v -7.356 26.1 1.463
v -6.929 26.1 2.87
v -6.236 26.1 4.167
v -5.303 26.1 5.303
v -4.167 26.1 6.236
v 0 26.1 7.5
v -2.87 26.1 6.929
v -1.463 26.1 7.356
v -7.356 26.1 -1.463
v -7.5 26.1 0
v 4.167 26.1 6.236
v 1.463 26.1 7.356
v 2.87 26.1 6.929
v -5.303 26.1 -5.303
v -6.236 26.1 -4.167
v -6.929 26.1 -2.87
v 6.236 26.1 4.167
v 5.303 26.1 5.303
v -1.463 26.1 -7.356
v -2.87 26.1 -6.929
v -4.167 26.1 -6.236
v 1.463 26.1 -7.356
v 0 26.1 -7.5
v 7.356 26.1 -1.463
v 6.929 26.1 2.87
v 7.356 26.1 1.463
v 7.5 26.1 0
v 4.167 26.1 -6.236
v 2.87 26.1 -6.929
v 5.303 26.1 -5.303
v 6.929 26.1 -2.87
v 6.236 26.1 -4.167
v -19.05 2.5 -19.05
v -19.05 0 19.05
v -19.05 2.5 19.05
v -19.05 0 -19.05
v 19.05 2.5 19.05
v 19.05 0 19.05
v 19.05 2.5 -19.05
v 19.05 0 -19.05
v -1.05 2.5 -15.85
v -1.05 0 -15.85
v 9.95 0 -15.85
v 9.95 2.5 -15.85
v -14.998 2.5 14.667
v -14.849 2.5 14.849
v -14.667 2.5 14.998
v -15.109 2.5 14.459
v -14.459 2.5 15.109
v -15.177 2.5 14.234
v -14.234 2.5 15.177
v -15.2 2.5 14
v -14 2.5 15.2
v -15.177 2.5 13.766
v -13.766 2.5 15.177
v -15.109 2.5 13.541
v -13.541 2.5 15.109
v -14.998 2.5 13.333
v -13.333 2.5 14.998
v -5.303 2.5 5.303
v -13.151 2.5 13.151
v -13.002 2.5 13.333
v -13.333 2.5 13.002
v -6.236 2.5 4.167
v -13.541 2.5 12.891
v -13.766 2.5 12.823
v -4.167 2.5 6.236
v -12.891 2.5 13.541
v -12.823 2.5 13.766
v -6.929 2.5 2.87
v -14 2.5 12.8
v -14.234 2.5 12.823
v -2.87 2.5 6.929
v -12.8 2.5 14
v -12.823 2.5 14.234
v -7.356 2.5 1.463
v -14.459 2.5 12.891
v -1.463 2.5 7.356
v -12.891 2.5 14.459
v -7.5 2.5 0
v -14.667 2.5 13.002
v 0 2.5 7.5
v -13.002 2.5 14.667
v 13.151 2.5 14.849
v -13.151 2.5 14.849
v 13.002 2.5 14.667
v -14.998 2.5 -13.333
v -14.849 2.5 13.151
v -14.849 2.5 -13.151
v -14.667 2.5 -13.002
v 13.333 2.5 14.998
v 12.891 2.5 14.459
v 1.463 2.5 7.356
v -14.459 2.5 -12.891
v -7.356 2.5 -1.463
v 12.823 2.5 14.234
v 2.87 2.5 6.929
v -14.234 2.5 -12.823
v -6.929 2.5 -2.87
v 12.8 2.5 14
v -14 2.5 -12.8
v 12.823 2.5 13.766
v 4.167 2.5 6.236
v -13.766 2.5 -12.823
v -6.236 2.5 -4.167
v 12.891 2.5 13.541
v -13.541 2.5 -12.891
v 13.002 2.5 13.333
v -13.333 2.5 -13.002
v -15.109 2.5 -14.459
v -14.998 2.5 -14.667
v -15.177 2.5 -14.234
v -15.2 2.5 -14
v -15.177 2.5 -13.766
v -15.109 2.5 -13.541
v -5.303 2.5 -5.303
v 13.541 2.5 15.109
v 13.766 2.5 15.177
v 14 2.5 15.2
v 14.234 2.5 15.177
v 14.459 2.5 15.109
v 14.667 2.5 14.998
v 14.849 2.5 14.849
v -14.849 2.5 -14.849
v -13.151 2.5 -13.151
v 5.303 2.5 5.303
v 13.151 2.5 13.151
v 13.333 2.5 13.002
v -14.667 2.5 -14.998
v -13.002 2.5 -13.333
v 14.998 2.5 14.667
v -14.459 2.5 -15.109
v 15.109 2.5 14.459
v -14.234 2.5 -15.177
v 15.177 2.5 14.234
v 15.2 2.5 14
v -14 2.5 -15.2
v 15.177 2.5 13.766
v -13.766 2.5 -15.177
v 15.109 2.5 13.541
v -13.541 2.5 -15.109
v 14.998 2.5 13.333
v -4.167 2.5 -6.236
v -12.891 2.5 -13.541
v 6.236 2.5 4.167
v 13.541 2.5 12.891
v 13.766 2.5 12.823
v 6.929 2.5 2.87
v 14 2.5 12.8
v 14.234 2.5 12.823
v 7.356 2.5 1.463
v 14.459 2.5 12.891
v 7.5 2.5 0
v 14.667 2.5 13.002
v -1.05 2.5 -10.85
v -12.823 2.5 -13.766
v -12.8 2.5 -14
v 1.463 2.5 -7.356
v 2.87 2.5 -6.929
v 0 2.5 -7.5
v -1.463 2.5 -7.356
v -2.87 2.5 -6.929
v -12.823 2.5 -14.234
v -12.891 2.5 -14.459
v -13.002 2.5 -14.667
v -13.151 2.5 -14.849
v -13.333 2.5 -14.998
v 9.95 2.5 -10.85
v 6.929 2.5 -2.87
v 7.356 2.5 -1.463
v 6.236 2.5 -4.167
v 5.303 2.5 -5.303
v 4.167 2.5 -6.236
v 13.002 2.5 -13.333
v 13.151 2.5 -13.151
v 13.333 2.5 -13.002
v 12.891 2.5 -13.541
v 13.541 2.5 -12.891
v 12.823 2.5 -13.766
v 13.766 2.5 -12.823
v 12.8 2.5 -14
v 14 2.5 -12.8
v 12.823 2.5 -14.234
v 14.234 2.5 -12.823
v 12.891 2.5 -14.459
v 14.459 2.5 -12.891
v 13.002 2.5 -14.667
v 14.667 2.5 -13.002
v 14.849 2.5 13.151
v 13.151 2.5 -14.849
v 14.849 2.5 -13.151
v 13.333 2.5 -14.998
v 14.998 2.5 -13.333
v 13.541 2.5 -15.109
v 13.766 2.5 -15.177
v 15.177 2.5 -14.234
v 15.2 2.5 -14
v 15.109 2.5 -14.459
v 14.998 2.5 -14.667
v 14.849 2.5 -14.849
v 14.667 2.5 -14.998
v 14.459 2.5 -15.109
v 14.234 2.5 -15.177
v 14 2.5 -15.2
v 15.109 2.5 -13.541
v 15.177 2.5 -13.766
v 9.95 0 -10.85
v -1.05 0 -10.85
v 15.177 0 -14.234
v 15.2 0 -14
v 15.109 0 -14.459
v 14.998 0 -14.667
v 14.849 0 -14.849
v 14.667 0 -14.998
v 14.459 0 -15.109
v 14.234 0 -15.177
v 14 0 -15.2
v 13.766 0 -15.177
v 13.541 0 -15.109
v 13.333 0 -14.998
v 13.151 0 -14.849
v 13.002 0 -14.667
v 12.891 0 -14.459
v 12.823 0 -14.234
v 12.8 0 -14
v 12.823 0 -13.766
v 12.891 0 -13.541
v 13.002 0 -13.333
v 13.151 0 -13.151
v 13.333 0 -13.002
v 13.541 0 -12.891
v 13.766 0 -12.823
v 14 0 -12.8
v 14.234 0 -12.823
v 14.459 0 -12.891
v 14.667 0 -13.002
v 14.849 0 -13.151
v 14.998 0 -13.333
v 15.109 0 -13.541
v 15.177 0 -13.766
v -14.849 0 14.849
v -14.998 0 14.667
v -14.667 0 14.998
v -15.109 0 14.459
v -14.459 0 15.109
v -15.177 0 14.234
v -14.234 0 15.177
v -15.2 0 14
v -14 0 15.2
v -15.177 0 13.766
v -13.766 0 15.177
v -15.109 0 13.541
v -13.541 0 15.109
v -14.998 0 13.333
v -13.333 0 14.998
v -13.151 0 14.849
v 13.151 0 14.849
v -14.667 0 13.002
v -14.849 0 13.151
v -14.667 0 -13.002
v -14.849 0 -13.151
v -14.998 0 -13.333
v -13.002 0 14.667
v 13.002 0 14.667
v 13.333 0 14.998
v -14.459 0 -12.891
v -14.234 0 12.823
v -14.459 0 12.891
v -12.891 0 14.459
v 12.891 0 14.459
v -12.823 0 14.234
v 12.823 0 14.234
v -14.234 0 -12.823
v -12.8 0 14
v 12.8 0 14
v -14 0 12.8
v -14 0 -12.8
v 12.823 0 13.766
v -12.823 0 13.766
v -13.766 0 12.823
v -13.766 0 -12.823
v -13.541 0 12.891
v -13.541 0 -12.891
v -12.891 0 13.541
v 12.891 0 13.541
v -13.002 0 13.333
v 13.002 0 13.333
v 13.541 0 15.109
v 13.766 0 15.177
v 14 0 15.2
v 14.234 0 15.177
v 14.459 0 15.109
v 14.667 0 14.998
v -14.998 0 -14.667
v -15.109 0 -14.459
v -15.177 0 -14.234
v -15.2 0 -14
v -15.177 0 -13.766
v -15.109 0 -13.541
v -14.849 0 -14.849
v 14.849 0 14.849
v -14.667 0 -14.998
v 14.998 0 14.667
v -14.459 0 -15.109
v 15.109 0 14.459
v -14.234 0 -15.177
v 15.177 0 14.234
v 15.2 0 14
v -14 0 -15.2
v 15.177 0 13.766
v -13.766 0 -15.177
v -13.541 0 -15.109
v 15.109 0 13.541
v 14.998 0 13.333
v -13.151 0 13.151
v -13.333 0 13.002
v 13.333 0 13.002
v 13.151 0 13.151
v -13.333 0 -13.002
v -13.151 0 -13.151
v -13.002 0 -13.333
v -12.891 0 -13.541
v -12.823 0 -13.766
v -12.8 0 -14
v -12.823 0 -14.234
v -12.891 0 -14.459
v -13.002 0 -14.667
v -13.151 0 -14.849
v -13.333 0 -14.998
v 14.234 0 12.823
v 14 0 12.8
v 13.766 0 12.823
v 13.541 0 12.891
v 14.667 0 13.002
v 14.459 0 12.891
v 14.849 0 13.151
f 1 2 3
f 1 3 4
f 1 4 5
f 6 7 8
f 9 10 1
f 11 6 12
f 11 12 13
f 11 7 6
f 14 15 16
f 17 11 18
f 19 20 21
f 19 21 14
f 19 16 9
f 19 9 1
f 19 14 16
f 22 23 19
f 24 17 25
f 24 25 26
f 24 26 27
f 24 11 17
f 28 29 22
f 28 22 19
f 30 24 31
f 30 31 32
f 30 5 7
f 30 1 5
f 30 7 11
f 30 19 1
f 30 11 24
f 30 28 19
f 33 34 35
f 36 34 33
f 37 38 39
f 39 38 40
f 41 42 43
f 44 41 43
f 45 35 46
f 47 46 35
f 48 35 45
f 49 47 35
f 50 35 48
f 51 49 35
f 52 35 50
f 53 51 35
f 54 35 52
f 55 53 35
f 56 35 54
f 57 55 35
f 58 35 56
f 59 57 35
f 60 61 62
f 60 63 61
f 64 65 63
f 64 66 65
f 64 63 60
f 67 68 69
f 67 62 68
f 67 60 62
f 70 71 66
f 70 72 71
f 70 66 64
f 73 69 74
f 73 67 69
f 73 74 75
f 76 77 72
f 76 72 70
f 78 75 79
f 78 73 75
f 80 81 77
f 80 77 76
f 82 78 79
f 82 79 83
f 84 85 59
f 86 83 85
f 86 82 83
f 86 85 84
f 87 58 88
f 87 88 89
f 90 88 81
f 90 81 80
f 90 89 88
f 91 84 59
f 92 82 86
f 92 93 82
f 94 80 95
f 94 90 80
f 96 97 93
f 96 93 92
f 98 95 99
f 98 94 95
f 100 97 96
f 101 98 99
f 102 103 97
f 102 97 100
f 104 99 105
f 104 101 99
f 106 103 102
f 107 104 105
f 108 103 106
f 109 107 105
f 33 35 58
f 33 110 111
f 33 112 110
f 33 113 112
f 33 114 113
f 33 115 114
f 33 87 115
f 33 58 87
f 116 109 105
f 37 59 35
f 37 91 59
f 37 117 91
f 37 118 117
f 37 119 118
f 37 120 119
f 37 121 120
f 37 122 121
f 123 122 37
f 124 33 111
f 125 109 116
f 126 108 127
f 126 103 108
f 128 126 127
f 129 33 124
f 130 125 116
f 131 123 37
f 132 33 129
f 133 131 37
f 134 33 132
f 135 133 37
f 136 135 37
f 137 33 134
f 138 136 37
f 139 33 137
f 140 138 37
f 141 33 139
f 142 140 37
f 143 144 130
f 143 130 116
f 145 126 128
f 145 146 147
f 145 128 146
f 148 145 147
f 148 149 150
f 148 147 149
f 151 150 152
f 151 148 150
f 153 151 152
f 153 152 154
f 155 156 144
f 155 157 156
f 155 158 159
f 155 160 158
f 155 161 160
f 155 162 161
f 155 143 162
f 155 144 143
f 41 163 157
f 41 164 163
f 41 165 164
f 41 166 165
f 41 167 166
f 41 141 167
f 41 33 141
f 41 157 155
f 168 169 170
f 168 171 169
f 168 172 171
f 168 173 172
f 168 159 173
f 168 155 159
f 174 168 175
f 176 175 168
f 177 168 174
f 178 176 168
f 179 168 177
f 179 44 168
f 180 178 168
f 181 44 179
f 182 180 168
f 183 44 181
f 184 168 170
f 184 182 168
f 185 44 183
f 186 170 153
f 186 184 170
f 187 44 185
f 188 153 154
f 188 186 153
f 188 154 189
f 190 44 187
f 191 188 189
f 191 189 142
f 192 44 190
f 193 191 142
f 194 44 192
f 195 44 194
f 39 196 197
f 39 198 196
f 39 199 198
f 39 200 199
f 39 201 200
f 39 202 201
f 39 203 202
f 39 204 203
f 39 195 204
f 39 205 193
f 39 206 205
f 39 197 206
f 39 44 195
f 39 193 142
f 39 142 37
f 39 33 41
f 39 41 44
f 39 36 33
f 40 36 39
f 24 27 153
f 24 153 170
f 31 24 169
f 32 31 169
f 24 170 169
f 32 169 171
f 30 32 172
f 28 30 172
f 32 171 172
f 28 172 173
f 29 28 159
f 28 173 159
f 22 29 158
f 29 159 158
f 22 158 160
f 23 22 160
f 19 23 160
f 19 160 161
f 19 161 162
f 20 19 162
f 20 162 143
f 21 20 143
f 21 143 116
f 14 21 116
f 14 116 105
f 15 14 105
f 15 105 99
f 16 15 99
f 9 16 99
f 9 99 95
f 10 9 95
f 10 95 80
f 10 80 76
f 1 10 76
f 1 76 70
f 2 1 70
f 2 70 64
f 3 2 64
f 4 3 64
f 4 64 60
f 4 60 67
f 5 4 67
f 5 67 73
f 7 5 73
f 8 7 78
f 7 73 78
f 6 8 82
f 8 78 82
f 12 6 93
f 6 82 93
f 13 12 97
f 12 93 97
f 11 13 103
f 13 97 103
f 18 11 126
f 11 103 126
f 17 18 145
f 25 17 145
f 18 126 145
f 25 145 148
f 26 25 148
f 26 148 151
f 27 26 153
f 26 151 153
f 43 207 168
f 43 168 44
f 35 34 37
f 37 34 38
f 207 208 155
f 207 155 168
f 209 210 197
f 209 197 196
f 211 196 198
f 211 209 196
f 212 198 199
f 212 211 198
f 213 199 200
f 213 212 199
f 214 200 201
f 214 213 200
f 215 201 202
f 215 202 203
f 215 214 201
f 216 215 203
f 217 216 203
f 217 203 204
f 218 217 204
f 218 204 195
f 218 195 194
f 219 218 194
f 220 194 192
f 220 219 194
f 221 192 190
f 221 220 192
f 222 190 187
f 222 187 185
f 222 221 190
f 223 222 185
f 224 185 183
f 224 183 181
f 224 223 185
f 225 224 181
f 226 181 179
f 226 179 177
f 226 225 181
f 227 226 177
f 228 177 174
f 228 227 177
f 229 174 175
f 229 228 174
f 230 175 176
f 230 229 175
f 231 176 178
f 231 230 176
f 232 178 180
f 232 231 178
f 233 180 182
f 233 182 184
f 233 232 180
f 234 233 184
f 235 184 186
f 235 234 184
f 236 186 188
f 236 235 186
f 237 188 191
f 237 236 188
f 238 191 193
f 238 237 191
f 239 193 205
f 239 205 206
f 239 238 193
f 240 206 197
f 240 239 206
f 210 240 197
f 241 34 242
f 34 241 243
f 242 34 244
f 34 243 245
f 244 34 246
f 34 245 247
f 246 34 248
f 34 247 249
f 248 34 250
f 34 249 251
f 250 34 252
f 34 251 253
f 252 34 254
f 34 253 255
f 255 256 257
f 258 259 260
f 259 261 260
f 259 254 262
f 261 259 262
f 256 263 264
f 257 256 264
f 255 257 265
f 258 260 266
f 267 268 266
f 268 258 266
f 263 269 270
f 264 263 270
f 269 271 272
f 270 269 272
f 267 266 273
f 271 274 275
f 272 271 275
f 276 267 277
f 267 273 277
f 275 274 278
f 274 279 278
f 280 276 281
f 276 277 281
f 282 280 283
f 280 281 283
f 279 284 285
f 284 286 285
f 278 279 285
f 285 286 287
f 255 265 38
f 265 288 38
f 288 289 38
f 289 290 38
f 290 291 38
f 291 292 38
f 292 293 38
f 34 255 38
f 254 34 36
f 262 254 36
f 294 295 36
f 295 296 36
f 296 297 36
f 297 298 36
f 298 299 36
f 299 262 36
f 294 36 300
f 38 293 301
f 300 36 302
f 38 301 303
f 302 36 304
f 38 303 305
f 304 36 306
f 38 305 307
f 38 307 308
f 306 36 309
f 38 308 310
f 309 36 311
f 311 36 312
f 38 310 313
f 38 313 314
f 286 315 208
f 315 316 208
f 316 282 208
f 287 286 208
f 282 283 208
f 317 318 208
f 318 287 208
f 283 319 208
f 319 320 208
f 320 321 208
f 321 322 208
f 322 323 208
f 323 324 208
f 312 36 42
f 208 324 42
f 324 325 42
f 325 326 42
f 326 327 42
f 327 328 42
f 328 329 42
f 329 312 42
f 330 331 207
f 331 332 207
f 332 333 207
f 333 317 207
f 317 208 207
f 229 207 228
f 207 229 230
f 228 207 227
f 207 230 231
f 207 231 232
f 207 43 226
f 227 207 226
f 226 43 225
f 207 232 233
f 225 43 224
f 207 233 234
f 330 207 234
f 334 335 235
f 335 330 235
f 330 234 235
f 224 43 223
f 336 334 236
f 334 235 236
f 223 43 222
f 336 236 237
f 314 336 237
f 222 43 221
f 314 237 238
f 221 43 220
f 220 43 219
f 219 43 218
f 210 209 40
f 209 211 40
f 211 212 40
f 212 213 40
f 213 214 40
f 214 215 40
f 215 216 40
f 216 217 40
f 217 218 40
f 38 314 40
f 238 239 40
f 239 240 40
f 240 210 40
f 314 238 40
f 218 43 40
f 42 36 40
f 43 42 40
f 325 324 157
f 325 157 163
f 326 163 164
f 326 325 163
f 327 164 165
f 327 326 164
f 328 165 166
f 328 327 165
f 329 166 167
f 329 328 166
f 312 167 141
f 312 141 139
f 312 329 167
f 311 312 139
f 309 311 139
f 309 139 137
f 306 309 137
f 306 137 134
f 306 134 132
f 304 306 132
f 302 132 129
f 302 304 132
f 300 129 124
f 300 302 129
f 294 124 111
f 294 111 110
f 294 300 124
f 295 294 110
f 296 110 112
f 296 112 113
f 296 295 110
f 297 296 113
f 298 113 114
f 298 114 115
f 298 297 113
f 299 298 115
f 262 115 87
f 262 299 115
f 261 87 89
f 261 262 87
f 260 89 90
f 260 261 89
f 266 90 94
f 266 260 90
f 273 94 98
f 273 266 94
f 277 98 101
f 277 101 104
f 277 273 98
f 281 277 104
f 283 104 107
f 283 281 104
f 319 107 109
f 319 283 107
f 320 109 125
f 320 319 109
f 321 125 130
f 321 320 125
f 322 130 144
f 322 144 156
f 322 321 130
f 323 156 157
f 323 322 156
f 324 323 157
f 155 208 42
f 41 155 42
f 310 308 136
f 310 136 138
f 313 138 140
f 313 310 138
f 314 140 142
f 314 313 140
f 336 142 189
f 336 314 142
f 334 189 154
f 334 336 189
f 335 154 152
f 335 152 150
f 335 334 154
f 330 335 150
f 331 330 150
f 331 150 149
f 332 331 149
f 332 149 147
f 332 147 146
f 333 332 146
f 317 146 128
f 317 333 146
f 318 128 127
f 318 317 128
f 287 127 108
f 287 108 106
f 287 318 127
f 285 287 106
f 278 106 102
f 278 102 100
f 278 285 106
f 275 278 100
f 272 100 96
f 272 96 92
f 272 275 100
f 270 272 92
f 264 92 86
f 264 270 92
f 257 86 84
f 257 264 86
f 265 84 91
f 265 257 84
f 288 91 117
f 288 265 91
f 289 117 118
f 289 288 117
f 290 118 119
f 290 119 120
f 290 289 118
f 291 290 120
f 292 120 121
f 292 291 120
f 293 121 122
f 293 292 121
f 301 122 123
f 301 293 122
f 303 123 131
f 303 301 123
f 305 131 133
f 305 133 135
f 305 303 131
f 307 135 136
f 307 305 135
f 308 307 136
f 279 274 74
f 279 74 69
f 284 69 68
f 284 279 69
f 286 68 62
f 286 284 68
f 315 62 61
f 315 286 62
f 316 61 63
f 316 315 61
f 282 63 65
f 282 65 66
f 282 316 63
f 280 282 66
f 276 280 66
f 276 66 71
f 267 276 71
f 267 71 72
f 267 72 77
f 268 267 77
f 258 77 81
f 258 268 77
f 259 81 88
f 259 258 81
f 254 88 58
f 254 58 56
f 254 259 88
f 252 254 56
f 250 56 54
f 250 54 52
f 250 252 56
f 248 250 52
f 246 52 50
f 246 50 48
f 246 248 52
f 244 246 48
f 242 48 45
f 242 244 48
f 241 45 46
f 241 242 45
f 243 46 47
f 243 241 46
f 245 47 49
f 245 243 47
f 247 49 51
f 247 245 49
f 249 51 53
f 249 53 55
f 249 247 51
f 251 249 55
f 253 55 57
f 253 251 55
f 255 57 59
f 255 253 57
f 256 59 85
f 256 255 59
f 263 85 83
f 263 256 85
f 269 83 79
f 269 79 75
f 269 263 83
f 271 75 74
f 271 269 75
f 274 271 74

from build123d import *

# Parameters (mm, degrees)
SKETCH1_W           = 38.1
SKETCH1_H           = 38.1
SKETCH1_R           = 1.2
SKETCH1_R_2         = 7.5
SKETCH1_W_2         = 11
SKETCH1_H_2         = 5
BOSS_EXTRUDE1_DEPTH = 2.5
SKETCH1_6_R         = 7.5
BOSS_EXTRUDE2_DEPTH = 26.1


with BuildPart() as part:
    # Sketch1 → Boss-Extrude1 (new body)
    with BuildSketch(Plane(origin=(0, 0, 0), x_dir=(1, 0, 0), z_dir=(0, 1, 0))):
        Rectangle(SKETCH1_W, SKETCH1_H)
        with Locations((-14, -14)):
            Circle(SKETCH1_R, mode=Mode.SUBTRACT)
        with Locations((14, -14)):
            Circle(SKETCH1_R, mode=Mode.SUBTRACT)
        with Locations((14, 14)):
            Circle(SKETCH1_R, mode=Mode.SUBTRACT)
        with Locations((-14, 14)):
            Circle(SKETCH1_R, mode=Mode.SUBTRACT)
        Circle(SKETCH1_R_2, mode=Mode.SUBTRACT)
        with Locations((4.45, 13.35)):
            Rectangle(SKETCH1_W_2, SKETCH1_H_2, mode=Mode.SUBTRACT)
    extrude(amount=BOSS_EXTRUDE1_DEPTH)

    # Sketch1<6> → Boss-Extrude2 (add)
    with BuildSketch(Plane(origin=(0, 0, 0), x_dir=(1, 0, 0), z_dir=(0, 1, 0))):
        Circle(SKETCH1_6_R)
    extrude(amount=BOSS_EXTRUDE2_DEPTH)


solid = part.part
